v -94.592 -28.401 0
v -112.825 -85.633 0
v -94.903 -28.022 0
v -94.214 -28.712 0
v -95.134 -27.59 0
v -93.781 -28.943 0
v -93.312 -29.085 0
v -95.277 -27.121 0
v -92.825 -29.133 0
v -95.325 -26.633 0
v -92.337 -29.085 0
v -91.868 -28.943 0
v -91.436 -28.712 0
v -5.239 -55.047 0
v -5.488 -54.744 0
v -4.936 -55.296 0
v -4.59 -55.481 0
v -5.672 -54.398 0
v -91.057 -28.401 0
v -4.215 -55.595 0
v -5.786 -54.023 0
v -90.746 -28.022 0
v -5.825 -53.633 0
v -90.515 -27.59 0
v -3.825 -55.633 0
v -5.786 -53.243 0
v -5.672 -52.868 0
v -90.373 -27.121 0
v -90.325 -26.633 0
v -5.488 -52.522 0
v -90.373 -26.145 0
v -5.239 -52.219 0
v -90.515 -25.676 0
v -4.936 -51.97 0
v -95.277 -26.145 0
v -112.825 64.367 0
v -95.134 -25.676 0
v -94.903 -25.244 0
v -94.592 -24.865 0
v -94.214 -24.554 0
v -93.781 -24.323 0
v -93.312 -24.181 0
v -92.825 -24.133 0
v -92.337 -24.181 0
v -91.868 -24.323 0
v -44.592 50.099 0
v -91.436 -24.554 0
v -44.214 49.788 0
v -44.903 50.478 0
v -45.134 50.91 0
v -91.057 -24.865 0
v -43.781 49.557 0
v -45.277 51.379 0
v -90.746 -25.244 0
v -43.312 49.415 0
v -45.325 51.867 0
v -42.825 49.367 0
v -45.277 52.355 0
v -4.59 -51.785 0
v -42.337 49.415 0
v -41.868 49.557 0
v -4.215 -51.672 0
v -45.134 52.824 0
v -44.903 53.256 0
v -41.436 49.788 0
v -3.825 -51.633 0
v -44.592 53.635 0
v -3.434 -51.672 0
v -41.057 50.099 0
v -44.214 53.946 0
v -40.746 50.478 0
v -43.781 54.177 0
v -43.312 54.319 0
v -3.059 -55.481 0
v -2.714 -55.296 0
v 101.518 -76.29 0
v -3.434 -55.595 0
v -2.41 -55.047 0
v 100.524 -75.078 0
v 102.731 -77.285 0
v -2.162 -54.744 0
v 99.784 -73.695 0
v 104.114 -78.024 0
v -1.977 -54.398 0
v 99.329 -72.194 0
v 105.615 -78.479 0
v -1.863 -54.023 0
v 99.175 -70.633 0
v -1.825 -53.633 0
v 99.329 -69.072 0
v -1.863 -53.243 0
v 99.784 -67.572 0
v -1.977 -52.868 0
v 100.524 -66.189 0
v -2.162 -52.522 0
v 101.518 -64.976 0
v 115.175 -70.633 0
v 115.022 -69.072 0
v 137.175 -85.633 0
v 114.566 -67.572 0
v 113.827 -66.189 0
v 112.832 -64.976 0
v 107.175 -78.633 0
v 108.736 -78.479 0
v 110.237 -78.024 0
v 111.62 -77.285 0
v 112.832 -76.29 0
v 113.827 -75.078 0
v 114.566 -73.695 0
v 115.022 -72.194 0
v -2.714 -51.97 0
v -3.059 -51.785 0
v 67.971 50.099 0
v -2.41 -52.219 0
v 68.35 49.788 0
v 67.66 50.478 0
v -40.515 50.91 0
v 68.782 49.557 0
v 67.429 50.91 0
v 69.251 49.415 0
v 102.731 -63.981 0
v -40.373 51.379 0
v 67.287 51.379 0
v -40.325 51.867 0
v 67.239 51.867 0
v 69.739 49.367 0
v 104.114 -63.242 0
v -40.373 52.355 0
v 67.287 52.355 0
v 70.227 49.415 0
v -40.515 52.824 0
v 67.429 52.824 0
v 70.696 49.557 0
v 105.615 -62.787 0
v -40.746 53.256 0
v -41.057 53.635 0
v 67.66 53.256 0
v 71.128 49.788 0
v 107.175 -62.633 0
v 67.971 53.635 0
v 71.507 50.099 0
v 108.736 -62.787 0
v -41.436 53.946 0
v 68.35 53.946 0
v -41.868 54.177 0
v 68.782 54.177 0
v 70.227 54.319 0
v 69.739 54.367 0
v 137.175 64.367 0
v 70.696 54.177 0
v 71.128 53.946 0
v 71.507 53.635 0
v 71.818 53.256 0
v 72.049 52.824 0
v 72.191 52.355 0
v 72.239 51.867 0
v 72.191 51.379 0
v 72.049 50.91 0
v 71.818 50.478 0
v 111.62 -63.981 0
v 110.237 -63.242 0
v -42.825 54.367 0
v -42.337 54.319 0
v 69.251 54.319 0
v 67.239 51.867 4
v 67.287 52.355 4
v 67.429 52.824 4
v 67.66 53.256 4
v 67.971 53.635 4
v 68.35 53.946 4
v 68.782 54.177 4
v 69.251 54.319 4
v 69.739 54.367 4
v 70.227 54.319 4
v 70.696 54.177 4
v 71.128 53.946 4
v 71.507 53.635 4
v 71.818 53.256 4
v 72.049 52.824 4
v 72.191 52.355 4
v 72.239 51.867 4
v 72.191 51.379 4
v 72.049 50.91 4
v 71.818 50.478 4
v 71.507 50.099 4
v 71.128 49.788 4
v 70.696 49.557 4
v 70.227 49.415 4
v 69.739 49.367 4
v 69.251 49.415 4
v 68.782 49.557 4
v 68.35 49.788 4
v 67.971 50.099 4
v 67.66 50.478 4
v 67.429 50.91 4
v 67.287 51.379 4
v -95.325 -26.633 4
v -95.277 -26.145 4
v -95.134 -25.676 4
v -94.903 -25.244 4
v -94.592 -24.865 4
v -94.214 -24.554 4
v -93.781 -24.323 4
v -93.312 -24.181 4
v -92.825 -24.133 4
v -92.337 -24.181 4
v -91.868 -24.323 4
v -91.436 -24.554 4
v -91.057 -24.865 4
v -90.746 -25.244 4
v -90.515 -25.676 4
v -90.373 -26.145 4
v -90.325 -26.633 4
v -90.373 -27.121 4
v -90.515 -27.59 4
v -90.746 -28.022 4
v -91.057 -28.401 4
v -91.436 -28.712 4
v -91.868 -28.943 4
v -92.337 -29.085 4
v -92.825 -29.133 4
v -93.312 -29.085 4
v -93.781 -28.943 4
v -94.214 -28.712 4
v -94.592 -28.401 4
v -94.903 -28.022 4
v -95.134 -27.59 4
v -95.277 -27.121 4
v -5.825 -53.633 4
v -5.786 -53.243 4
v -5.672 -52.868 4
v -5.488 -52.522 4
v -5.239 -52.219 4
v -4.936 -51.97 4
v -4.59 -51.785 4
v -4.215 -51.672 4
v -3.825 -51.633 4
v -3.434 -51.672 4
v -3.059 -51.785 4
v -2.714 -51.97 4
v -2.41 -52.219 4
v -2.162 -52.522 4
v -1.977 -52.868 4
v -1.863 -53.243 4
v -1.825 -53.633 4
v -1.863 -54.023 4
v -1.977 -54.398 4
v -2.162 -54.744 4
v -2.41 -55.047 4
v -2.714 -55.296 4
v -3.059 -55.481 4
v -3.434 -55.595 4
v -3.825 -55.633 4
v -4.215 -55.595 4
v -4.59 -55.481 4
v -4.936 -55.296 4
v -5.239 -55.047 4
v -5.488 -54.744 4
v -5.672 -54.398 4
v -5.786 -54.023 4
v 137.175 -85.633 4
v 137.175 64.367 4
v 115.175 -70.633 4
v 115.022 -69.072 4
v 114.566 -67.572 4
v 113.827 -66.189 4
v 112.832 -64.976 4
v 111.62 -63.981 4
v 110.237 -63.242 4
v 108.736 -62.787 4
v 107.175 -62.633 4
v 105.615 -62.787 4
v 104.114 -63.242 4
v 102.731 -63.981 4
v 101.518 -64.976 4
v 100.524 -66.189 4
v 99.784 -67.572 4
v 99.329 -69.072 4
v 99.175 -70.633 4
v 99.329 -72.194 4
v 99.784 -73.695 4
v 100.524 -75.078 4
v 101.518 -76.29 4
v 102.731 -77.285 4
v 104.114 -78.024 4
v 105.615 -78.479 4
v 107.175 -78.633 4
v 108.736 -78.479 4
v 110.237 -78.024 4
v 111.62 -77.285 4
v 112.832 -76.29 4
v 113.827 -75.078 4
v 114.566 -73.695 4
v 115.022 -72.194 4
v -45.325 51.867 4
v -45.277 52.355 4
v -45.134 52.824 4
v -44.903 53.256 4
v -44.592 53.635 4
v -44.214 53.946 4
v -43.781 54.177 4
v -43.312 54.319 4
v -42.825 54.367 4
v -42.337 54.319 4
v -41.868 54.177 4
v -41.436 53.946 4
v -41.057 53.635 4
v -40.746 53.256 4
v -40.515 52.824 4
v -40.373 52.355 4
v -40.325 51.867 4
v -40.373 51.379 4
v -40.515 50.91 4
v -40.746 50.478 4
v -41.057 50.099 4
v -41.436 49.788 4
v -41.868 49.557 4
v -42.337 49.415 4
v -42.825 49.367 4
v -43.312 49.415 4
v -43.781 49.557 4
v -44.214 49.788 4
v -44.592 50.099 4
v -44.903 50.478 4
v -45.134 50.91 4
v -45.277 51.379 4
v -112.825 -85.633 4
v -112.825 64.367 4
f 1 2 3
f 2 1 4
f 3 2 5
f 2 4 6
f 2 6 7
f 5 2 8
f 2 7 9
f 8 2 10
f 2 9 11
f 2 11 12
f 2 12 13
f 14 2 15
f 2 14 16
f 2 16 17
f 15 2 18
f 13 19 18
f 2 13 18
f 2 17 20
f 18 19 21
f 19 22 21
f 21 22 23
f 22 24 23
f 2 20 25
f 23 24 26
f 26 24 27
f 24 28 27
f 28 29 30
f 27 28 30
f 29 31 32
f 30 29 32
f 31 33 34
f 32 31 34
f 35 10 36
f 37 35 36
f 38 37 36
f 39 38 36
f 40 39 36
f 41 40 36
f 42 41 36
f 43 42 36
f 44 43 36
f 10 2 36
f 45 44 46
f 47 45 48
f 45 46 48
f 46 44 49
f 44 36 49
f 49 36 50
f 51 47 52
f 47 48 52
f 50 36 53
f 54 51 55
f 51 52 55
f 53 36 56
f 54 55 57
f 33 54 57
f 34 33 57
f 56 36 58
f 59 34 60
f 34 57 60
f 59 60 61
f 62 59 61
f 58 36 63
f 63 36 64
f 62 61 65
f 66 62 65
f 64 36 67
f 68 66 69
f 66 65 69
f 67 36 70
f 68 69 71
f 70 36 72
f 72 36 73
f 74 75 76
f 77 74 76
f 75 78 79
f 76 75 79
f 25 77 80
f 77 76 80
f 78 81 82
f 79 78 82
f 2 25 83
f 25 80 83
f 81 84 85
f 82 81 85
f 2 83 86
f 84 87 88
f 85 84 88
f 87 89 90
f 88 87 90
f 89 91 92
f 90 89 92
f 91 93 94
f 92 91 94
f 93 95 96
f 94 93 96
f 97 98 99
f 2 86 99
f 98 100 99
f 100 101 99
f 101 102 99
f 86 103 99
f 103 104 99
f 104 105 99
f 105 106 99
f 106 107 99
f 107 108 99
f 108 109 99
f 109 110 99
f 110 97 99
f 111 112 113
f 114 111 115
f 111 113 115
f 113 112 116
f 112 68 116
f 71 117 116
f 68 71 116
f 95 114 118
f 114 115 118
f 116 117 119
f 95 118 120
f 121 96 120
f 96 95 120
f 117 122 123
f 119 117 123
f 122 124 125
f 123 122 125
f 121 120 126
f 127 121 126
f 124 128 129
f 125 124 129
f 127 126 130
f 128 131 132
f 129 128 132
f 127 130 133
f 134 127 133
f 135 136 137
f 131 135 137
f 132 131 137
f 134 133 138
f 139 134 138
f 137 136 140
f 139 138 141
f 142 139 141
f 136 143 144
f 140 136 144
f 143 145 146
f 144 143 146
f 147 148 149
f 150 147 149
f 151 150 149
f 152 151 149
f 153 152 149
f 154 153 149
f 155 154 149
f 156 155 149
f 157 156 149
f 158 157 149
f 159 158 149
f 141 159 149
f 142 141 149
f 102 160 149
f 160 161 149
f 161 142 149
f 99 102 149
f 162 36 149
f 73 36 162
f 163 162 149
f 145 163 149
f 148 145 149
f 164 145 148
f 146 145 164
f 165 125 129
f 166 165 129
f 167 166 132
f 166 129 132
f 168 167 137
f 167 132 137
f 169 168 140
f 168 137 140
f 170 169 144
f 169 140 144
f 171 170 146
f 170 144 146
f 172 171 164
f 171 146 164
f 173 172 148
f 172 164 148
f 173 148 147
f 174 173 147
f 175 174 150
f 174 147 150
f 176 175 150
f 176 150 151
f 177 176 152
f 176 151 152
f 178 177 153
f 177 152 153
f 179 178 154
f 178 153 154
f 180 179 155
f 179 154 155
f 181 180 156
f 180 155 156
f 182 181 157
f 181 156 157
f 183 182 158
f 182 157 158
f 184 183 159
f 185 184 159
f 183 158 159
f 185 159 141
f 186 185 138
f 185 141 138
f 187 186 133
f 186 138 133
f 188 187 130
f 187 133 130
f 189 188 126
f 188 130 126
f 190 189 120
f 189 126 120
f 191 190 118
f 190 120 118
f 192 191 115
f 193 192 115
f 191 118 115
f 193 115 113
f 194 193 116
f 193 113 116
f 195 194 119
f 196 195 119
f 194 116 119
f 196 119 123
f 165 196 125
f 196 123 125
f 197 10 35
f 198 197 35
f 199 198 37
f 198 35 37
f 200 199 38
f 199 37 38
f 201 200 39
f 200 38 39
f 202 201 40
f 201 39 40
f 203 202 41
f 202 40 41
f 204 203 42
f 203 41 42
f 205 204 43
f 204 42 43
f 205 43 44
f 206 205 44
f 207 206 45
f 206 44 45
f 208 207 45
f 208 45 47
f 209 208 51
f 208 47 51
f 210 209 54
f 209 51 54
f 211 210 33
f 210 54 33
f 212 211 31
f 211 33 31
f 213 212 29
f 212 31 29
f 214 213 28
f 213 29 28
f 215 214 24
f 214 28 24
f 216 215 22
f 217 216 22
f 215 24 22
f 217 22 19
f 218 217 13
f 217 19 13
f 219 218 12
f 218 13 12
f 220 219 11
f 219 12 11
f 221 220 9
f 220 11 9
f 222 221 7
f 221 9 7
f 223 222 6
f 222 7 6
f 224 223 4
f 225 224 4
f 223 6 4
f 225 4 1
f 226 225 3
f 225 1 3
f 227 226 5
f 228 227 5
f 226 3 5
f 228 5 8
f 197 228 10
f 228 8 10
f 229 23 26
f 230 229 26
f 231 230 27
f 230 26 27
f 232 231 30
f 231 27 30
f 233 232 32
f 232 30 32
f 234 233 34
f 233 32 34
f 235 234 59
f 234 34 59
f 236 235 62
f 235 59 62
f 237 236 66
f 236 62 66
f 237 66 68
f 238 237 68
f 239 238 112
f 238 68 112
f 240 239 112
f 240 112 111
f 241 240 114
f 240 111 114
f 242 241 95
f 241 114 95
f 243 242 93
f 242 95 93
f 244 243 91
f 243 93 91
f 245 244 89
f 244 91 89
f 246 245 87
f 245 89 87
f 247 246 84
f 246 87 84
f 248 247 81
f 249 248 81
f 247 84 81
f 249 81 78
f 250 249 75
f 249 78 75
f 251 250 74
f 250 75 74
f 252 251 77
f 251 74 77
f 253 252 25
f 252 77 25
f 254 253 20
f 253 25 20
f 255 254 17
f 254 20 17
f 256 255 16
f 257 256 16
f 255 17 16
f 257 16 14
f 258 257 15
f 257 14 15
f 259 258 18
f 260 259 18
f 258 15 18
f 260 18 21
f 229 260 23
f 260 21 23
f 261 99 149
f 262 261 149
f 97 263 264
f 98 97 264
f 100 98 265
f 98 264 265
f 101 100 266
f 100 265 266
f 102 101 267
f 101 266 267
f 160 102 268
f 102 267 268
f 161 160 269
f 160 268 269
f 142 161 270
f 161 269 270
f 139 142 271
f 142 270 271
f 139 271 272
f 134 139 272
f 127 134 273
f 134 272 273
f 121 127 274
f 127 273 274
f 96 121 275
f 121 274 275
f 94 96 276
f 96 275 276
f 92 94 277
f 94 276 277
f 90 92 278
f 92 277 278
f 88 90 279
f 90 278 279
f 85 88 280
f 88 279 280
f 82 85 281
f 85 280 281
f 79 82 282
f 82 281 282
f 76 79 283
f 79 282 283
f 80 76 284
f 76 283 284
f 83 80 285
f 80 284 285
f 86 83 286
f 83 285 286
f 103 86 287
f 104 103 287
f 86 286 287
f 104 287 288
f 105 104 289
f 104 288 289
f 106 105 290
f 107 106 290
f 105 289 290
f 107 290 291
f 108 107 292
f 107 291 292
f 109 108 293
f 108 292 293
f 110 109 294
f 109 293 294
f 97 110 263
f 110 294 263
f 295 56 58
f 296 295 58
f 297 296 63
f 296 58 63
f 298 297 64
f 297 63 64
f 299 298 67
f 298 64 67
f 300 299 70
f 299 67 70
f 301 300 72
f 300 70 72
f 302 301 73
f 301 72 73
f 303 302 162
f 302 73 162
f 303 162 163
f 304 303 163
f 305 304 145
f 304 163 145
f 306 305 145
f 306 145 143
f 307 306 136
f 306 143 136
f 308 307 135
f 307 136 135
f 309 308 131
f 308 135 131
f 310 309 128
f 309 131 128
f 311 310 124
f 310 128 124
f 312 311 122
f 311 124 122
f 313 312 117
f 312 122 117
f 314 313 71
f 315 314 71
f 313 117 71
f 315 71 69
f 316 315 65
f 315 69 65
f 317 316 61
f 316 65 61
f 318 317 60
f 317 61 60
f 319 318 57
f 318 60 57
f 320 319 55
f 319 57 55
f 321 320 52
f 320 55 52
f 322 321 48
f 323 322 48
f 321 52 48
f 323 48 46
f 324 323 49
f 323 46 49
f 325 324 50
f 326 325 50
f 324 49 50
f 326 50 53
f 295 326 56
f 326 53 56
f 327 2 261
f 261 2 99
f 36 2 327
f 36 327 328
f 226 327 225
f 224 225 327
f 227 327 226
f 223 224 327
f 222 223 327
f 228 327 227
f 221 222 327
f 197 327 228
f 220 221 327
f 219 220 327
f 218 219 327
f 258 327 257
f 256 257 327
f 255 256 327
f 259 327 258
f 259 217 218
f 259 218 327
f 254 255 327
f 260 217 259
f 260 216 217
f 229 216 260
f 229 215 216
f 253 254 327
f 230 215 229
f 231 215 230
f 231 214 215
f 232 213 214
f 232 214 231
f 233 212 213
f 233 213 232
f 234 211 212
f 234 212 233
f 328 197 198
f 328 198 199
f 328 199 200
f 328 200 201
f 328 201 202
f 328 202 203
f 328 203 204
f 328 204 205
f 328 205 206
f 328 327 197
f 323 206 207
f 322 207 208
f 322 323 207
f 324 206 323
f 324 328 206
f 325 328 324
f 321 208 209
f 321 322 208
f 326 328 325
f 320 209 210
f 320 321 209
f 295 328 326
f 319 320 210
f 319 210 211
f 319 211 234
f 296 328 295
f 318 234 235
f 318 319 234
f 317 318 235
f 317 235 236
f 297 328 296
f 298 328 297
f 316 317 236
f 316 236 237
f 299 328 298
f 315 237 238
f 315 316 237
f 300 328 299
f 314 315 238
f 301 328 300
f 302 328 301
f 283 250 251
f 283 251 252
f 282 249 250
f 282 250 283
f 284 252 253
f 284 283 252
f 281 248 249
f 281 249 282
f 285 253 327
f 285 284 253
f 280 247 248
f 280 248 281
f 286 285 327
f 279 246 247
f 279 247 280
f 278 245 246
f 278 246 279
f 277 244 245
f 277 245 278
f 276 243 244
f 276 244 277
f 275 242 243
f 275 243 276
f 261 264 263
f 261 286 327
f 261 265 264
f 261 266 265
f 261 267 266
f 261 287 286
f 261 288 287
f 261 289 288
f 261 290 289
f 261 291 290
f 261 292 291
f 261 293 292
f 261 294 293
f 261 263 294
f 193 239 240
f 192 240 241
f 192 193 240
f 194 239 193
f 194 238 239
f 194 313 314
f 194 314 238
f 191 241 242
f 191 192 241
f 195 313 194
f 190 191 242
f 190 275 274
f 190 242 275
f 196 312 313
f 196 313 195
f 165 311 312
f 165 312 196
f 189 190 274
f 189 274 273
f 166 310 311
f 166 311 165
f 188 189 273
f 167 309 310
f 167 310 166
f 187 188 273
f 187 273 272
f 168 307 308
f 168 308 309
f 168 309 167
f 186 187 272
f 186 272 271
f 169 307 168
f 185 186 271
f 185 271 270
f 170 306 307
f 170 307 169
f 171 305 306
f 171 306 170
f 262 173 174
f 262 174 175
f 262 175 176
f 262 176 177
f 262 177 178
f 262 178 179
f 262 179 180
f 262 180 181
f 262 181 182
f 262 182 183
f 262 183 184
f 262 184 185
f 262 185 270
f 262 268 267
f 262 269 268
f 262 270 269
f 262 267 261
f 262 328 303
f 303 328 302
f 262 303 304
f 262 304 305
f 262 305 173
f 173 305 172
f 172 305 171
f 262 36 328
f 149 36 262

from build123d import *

# Parameters (mm, degrees)
SKETCH1_W           = 250
SKETCH1_H           = 150
BOSS_EXTRUDE1_DEPTH = 4
SKETCH2_R           = 8
CUT_EXTRUDE1_DEPTH  = 4
SKETCH3_R           = 2.5
SKETCH3_R_2         = 2
CUT_EXTRUDE2_DEPTH  = 4


with BuildPart() as part:
    # Sketch1 → Boss-Extrude1 (new body)
    with BuildSketch(Plane.XY):
        with Locations((12.175324675, -10.633116883)):
            Rectangle(SKETCH1_W, SKETCH1_H)
    extrude(amount=BOSS_EXTRUDE1_DEPTH)

    # Sketch2 → Cut-Extrude1 (cut)
    with BuildSketch(Plane.XY.offset(4)):
        with Locations((107.175324675, -70.633116883)):
            Circle(SKETCH2_R)
    extrude(amount=-CUT_EXTRUDE1_DEPTH, mode=Mode.SUBTRACT)

    # Sketch3 → Cut-Extrude2 (cut)
    with BuildSketch(Plane(origin=(0, 0, 0), x_dir=(-1, 0, 0), z_dir=(0, 0, -1))):
        with Locations((42.824675325, 51.866883117)):
            Circle(SKETCH3_R)
        with Locations((92.824675325, -26.633116883)):
            Circle(SKETCH3_R)
        with Locations((-69.739145404, 51.866883117)):
            Circle(SKETCH3_R)
        with Locations((3.824675325, -53.633116883)):
            Circle(SKETCH3_R_2)
    extrude(amount=-CUT_EXTRUDE2_DEPTH, mode=Mode.SUBTRACT)


solid = part.part
